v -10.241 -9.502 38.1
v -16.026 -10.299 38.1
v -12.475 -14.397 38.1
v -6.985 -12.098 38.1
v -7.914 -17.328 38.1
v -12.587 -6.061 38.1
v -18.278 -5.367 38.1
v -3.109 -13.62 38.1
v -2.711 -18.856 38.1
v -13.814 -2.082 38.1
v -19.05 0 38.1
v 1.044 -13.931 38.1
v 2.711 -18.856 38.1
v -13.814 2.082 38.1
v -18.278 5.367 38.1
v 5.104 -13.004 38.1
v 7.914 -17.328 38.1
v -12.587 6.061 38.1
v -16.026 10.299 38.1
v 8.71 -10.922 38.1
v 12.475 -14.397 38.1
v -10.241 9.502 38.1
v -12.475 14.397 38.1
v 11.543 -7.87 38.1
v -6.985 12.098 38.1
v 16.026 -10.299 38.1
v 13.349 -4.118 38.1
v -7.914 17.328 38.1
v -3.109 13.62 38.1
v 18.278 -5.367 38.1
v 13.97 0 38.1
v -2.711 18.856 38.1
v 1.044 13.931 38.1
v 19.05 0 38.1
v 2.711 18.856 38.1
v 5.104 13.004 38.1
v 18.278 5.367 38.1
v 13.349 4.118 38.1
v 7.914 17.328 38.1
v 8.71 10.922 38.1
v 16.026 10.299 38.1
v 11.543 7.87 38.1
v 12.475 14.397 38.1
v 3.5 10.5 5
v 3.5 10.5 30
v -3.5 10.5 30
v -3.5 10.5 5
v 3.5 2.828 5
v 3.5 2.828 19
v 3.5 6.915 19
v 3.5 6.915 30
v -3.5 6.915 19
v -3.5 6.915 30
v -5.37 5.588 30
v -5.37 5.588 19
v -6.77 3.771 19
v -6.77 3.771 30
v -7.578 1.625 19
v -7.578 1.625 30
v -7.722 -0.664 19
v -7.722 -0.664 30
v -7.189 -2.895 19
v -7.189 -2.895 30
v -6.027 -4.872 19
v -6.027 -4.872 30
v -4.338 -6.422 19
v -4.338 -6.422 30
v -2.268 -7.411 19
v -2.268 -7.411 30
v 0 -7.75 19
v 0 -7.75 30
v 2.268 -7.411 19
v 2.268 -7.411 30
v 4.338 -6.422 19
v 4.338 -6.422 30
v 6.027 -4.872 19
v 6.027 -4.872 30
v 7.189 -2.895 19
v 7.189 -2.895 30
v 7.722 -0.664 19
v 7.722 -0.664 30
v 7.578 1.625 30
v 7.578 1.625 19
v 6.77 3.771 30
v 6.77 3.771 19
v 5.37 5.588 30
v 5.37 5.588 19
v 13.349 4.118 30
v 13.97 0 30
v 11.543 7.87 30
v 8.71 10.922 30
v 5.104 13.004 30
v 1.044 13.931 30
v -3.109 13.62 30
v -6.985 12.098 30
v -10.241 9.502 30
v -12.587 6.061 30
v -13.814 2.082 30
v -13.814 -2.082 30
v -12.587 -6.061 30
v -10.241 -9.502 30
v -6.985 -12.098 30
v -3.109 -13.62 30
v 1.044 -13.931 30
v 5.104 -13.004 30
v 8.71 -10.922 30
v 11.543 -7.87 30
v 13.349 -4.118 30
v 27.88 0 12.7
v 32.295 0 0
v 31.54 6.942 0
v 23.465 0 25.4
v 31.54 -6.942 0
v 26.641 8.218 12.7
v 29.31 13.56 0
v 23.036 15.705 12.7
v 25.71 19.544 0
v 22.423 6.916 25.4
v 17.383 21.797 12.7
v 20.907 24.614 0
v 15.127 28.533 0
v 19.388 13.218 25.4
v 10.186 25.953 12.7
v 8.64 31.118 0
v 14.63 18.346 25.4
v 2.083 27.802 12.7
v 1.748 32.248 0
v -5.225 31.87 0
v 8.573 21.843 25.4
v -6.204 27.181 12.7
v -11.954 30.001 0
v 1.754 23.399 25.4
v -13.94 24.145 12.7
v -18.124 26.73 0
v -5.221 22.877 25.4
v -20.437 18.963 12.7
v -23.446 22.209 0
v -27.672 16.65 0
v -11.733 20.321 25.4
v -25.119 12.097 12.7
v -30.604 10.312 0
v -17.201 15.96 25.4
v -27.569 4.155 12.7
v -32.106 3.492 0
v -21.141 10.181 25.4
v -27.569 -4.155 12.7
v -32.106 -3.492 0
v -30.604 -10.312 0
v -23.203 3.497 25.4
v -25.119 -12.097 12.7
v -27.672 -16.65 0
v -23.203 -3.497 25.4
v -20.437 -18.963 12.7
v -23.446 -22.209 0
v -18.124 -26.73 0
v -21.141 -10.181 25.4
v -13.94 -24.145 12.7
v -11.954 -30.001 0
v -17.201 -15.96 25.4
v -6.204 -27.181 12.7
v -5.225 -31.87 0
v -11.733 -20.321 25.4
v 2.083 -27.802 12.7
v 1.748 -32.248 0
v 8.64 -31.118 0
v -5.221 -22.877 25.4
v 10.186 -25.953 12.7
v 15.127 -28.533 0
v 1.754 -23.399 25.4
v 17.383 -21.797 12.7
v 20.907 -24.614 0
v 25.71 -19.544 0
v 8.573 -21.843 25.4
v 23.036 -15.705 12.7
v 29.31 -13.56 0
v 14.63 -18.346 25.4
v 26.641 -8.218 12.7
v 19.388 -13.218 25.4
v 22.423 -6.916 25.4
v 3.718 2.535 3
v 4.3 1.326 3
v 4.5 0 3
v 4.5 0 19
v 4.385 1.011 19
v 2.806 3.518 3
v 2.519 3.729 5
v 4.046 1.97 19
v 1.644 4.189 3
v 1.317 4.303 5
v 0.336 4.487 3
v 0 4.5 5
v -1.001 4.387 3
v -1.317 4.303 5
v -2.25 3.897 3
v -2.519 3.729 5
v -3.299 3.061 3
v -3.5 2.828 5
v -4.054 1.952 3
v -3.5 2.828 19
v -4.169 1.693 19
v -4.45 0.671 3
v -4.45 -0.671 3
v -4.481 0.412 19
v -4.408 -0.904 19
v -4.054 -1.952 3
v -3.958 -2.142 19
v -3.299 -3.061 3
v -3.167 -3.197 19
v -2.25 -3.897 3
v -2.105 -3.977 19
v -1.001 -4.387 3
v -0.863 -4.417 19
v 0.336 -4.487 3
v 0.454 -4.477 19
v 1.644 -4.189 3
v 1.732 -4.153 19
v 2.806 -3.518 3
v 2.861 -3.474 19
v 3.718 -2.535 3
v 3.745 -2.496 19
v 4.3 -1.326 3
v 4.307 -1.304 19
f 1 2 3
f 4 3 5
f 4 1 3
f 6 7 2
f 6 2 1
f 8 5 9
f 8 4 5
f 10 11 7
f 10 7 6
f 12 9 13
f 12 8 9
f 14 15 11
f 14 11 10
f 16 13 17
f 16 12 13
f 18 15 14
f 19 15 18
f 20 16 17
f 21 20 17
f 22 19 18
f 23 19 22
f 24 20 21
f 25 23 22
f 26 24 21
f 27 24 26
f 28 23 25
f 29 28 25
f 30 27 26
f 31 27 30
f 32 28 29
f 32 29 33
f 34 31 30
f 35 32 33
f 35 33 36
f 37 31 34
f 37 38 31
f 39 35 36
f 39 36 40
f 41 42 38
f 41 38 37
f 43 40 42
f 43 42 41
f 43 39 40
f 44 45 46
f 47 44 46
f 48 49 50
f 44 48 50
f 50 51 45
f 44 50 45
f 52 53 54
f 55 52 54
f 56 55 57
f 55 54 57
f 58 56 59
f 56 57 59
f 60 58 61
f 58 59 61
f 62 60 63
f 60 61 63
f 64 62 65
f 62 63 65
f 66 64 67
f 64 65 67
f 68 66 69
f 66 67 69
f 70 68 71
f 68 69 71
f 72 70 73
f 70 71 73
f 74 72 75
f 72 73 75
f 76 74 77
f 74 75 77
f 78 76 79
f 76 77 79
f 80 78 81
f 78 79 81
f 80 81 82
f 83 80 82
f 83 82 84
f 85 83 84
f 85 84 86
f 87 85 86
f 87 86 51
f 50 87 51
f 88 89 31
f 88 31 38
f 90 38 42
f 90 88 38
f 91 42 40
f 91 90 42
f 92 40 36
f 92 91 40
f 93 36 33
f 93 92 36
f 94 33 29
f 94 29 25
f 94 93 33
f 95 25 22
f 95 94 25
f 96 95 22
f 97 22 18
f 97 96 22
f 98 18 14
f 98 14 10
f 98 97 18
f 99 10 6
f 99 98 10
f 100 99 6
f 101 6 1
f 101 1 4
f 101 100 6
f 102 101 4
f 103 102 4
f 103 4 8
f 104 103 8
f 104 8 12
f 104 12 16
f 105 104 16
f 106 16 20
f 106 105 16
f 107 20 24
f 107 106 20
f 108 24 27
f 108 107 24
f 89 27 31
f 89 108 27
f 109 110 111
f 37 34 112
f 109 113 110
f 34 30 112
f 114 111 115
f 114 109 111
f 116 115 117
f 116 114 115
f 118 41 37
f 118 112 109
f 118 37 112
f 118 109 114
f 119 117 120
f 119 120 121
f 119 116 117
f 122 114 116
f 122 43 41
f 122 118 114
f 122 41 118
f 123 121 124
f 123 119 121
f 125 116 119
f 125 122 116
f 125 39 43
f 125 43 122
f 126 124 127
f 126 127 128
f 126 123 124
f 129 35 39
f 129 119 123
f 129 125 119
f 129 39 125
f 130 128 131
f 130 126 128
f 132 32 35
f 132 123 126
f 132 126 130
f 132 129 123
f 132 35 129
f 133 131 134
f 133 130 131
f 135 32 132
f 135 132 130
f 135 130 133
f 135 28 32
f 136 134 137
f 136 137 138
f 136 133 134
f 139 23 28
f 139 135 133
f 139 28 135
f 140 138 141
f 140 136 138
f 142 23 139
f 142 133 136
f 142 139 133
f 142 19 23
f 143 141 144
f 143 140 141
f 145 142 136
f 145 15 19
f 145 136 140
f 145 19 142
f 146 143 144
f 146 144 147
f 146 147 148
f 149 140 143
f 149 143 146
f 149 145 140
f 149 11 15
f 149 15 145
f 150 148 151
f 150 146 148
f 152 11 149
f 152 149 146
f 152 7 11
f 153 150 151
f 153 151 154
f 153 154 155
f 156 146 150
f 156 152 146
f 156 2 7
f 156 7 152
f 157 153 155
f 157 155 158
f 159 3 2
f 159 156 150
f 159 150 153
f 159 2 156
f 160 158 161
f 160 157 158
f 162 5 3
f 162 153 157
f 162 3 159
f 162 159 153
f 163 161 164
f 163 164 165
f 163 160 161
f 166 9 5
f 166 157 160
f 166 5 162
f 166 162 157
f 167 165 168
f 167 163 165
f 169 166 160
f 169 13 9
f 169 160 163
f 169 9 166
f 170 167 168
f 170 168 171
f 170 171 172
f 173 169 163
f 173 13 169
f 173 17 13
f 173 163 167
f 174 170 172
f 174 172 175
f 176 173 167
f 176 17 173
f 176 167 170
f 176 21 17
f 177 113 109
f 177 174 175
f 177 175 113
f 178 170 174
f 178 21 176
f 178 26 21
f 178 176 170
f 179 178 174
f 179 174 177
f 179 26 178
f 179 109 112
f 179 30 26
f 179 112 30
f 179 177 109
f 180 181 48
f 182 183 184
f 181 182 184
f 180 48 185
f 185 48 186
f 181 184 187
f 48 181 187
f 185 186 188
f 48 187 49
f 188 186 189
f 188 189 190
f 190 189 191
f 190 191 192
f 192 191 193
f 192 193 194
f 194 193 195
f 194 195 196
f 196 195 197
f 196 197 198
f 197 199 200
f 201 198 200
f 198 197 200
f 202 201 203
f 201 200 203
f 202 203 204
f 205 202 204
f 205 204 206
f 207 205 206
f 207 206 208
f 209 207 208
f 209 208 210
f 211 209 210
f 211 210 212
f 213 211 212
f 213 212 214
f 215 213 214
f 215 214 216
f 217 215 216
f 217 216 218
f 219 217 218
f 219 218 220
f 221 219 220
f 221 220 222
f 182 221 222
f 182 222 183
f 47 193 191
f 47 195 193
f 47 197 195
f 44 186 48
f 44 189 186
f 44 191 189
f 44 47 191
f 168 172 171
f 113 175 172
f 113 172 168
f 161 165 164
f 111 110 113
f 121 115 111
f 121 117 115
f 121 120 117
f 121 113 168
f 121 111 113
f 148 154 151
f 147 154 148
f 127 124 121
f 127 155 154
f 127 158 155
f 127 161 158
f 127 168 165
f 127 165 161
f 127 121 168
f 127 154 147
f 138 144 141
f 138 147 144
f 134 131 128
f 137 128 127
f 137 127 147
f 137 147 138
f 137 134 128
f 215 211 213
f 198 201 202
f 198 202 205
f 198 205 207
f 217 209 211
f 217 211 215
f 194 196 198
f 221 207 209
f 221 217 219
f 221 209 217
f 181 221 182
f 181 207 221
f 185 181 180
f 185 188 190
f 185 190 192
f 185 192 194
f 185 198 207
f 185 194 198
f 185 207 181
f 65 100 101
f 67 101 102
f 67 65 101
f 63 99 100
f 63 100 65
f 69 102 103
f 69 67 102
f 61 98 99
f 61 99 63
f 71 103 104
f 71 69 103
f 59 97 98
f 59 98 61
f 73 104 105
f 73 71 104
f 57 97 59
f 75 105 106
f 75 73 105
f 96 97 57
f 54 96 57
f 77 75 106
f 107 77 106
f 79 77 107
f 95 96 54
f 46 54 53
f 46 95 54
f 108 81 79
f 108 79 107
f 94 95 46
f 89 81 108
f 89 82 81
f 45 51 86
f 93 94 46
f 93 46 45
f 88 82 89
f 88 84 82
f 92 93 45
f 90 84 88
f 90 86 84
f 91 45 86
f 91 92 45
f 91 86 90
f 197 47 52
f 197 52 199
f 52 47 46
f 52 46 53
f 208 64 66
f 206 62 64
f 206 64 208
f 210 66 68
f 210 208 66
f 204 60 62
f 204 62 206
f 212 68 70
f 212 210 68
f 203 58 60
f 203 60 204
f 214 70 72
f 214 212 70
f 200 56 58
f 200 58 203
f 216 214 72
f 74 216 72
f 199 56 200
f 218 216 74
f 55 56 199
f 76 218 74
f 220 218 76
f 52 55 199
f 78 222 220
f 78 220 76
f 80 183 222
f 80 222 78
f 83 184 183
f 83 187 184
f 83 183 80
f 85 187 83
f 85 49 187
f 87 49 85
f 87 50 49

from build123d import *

# Parameters (mm, degrees)
F3_R      = 14
F4_DEPTH  = 30
F6_R      = 4.5
F7_DEPTH  = 27
F5_R      = 7.75
F8_DEPTH  = 11
F10_DEPTH = 25


# Not quite as in the source:
# - a feature names something its author has since deleted; it is built from what else it names


with BuildPart() as f2:
    # F0 (on Front) → F2 (revolve)
    with BuildSketch(Plane.XZ):
        Polygon((32.2950072587, 0), (19.05, 38.1), (13.97, 38.1), (13.97, 0), align=None)
    revolve(axis=Axis((0, 0, 18.1650817394), (0, 0, 1)))

    # F3 (on Top) → F4 (join)
    with BuildSketch(Plane.XY):
        Circle(F3_R)
    extrude(amount=F4_DEPTH)

    # F6 (on face) → F7 (cut)
    with BuildSketch(Plane.XY.offset(30)):
        Circle(F6_R)
    extrude(amount=-F7_DEPTH, mode=Mode.SUBTRACT)

    # F5 (on face) → F8 (cut)
    with BuildSketch(Plane.XY.offset(30)):
        Circle(F5_R)
    extrude(amount=-F8_DEPTH, mode=Mode.SUBTRACT)

    # F9 (on face) → F10 (cut)
    with BuildSketch(Plane.XY.offset(30)):
        Polygon((-3.5, 0), (0, 0), (3.5, 0), (3.5, 10.5), (-3.5, 10.5), align=None)
    extrude(amount=-F10_DEPTH, mode=Mode.SUBTRACT)


solid = f2.part
